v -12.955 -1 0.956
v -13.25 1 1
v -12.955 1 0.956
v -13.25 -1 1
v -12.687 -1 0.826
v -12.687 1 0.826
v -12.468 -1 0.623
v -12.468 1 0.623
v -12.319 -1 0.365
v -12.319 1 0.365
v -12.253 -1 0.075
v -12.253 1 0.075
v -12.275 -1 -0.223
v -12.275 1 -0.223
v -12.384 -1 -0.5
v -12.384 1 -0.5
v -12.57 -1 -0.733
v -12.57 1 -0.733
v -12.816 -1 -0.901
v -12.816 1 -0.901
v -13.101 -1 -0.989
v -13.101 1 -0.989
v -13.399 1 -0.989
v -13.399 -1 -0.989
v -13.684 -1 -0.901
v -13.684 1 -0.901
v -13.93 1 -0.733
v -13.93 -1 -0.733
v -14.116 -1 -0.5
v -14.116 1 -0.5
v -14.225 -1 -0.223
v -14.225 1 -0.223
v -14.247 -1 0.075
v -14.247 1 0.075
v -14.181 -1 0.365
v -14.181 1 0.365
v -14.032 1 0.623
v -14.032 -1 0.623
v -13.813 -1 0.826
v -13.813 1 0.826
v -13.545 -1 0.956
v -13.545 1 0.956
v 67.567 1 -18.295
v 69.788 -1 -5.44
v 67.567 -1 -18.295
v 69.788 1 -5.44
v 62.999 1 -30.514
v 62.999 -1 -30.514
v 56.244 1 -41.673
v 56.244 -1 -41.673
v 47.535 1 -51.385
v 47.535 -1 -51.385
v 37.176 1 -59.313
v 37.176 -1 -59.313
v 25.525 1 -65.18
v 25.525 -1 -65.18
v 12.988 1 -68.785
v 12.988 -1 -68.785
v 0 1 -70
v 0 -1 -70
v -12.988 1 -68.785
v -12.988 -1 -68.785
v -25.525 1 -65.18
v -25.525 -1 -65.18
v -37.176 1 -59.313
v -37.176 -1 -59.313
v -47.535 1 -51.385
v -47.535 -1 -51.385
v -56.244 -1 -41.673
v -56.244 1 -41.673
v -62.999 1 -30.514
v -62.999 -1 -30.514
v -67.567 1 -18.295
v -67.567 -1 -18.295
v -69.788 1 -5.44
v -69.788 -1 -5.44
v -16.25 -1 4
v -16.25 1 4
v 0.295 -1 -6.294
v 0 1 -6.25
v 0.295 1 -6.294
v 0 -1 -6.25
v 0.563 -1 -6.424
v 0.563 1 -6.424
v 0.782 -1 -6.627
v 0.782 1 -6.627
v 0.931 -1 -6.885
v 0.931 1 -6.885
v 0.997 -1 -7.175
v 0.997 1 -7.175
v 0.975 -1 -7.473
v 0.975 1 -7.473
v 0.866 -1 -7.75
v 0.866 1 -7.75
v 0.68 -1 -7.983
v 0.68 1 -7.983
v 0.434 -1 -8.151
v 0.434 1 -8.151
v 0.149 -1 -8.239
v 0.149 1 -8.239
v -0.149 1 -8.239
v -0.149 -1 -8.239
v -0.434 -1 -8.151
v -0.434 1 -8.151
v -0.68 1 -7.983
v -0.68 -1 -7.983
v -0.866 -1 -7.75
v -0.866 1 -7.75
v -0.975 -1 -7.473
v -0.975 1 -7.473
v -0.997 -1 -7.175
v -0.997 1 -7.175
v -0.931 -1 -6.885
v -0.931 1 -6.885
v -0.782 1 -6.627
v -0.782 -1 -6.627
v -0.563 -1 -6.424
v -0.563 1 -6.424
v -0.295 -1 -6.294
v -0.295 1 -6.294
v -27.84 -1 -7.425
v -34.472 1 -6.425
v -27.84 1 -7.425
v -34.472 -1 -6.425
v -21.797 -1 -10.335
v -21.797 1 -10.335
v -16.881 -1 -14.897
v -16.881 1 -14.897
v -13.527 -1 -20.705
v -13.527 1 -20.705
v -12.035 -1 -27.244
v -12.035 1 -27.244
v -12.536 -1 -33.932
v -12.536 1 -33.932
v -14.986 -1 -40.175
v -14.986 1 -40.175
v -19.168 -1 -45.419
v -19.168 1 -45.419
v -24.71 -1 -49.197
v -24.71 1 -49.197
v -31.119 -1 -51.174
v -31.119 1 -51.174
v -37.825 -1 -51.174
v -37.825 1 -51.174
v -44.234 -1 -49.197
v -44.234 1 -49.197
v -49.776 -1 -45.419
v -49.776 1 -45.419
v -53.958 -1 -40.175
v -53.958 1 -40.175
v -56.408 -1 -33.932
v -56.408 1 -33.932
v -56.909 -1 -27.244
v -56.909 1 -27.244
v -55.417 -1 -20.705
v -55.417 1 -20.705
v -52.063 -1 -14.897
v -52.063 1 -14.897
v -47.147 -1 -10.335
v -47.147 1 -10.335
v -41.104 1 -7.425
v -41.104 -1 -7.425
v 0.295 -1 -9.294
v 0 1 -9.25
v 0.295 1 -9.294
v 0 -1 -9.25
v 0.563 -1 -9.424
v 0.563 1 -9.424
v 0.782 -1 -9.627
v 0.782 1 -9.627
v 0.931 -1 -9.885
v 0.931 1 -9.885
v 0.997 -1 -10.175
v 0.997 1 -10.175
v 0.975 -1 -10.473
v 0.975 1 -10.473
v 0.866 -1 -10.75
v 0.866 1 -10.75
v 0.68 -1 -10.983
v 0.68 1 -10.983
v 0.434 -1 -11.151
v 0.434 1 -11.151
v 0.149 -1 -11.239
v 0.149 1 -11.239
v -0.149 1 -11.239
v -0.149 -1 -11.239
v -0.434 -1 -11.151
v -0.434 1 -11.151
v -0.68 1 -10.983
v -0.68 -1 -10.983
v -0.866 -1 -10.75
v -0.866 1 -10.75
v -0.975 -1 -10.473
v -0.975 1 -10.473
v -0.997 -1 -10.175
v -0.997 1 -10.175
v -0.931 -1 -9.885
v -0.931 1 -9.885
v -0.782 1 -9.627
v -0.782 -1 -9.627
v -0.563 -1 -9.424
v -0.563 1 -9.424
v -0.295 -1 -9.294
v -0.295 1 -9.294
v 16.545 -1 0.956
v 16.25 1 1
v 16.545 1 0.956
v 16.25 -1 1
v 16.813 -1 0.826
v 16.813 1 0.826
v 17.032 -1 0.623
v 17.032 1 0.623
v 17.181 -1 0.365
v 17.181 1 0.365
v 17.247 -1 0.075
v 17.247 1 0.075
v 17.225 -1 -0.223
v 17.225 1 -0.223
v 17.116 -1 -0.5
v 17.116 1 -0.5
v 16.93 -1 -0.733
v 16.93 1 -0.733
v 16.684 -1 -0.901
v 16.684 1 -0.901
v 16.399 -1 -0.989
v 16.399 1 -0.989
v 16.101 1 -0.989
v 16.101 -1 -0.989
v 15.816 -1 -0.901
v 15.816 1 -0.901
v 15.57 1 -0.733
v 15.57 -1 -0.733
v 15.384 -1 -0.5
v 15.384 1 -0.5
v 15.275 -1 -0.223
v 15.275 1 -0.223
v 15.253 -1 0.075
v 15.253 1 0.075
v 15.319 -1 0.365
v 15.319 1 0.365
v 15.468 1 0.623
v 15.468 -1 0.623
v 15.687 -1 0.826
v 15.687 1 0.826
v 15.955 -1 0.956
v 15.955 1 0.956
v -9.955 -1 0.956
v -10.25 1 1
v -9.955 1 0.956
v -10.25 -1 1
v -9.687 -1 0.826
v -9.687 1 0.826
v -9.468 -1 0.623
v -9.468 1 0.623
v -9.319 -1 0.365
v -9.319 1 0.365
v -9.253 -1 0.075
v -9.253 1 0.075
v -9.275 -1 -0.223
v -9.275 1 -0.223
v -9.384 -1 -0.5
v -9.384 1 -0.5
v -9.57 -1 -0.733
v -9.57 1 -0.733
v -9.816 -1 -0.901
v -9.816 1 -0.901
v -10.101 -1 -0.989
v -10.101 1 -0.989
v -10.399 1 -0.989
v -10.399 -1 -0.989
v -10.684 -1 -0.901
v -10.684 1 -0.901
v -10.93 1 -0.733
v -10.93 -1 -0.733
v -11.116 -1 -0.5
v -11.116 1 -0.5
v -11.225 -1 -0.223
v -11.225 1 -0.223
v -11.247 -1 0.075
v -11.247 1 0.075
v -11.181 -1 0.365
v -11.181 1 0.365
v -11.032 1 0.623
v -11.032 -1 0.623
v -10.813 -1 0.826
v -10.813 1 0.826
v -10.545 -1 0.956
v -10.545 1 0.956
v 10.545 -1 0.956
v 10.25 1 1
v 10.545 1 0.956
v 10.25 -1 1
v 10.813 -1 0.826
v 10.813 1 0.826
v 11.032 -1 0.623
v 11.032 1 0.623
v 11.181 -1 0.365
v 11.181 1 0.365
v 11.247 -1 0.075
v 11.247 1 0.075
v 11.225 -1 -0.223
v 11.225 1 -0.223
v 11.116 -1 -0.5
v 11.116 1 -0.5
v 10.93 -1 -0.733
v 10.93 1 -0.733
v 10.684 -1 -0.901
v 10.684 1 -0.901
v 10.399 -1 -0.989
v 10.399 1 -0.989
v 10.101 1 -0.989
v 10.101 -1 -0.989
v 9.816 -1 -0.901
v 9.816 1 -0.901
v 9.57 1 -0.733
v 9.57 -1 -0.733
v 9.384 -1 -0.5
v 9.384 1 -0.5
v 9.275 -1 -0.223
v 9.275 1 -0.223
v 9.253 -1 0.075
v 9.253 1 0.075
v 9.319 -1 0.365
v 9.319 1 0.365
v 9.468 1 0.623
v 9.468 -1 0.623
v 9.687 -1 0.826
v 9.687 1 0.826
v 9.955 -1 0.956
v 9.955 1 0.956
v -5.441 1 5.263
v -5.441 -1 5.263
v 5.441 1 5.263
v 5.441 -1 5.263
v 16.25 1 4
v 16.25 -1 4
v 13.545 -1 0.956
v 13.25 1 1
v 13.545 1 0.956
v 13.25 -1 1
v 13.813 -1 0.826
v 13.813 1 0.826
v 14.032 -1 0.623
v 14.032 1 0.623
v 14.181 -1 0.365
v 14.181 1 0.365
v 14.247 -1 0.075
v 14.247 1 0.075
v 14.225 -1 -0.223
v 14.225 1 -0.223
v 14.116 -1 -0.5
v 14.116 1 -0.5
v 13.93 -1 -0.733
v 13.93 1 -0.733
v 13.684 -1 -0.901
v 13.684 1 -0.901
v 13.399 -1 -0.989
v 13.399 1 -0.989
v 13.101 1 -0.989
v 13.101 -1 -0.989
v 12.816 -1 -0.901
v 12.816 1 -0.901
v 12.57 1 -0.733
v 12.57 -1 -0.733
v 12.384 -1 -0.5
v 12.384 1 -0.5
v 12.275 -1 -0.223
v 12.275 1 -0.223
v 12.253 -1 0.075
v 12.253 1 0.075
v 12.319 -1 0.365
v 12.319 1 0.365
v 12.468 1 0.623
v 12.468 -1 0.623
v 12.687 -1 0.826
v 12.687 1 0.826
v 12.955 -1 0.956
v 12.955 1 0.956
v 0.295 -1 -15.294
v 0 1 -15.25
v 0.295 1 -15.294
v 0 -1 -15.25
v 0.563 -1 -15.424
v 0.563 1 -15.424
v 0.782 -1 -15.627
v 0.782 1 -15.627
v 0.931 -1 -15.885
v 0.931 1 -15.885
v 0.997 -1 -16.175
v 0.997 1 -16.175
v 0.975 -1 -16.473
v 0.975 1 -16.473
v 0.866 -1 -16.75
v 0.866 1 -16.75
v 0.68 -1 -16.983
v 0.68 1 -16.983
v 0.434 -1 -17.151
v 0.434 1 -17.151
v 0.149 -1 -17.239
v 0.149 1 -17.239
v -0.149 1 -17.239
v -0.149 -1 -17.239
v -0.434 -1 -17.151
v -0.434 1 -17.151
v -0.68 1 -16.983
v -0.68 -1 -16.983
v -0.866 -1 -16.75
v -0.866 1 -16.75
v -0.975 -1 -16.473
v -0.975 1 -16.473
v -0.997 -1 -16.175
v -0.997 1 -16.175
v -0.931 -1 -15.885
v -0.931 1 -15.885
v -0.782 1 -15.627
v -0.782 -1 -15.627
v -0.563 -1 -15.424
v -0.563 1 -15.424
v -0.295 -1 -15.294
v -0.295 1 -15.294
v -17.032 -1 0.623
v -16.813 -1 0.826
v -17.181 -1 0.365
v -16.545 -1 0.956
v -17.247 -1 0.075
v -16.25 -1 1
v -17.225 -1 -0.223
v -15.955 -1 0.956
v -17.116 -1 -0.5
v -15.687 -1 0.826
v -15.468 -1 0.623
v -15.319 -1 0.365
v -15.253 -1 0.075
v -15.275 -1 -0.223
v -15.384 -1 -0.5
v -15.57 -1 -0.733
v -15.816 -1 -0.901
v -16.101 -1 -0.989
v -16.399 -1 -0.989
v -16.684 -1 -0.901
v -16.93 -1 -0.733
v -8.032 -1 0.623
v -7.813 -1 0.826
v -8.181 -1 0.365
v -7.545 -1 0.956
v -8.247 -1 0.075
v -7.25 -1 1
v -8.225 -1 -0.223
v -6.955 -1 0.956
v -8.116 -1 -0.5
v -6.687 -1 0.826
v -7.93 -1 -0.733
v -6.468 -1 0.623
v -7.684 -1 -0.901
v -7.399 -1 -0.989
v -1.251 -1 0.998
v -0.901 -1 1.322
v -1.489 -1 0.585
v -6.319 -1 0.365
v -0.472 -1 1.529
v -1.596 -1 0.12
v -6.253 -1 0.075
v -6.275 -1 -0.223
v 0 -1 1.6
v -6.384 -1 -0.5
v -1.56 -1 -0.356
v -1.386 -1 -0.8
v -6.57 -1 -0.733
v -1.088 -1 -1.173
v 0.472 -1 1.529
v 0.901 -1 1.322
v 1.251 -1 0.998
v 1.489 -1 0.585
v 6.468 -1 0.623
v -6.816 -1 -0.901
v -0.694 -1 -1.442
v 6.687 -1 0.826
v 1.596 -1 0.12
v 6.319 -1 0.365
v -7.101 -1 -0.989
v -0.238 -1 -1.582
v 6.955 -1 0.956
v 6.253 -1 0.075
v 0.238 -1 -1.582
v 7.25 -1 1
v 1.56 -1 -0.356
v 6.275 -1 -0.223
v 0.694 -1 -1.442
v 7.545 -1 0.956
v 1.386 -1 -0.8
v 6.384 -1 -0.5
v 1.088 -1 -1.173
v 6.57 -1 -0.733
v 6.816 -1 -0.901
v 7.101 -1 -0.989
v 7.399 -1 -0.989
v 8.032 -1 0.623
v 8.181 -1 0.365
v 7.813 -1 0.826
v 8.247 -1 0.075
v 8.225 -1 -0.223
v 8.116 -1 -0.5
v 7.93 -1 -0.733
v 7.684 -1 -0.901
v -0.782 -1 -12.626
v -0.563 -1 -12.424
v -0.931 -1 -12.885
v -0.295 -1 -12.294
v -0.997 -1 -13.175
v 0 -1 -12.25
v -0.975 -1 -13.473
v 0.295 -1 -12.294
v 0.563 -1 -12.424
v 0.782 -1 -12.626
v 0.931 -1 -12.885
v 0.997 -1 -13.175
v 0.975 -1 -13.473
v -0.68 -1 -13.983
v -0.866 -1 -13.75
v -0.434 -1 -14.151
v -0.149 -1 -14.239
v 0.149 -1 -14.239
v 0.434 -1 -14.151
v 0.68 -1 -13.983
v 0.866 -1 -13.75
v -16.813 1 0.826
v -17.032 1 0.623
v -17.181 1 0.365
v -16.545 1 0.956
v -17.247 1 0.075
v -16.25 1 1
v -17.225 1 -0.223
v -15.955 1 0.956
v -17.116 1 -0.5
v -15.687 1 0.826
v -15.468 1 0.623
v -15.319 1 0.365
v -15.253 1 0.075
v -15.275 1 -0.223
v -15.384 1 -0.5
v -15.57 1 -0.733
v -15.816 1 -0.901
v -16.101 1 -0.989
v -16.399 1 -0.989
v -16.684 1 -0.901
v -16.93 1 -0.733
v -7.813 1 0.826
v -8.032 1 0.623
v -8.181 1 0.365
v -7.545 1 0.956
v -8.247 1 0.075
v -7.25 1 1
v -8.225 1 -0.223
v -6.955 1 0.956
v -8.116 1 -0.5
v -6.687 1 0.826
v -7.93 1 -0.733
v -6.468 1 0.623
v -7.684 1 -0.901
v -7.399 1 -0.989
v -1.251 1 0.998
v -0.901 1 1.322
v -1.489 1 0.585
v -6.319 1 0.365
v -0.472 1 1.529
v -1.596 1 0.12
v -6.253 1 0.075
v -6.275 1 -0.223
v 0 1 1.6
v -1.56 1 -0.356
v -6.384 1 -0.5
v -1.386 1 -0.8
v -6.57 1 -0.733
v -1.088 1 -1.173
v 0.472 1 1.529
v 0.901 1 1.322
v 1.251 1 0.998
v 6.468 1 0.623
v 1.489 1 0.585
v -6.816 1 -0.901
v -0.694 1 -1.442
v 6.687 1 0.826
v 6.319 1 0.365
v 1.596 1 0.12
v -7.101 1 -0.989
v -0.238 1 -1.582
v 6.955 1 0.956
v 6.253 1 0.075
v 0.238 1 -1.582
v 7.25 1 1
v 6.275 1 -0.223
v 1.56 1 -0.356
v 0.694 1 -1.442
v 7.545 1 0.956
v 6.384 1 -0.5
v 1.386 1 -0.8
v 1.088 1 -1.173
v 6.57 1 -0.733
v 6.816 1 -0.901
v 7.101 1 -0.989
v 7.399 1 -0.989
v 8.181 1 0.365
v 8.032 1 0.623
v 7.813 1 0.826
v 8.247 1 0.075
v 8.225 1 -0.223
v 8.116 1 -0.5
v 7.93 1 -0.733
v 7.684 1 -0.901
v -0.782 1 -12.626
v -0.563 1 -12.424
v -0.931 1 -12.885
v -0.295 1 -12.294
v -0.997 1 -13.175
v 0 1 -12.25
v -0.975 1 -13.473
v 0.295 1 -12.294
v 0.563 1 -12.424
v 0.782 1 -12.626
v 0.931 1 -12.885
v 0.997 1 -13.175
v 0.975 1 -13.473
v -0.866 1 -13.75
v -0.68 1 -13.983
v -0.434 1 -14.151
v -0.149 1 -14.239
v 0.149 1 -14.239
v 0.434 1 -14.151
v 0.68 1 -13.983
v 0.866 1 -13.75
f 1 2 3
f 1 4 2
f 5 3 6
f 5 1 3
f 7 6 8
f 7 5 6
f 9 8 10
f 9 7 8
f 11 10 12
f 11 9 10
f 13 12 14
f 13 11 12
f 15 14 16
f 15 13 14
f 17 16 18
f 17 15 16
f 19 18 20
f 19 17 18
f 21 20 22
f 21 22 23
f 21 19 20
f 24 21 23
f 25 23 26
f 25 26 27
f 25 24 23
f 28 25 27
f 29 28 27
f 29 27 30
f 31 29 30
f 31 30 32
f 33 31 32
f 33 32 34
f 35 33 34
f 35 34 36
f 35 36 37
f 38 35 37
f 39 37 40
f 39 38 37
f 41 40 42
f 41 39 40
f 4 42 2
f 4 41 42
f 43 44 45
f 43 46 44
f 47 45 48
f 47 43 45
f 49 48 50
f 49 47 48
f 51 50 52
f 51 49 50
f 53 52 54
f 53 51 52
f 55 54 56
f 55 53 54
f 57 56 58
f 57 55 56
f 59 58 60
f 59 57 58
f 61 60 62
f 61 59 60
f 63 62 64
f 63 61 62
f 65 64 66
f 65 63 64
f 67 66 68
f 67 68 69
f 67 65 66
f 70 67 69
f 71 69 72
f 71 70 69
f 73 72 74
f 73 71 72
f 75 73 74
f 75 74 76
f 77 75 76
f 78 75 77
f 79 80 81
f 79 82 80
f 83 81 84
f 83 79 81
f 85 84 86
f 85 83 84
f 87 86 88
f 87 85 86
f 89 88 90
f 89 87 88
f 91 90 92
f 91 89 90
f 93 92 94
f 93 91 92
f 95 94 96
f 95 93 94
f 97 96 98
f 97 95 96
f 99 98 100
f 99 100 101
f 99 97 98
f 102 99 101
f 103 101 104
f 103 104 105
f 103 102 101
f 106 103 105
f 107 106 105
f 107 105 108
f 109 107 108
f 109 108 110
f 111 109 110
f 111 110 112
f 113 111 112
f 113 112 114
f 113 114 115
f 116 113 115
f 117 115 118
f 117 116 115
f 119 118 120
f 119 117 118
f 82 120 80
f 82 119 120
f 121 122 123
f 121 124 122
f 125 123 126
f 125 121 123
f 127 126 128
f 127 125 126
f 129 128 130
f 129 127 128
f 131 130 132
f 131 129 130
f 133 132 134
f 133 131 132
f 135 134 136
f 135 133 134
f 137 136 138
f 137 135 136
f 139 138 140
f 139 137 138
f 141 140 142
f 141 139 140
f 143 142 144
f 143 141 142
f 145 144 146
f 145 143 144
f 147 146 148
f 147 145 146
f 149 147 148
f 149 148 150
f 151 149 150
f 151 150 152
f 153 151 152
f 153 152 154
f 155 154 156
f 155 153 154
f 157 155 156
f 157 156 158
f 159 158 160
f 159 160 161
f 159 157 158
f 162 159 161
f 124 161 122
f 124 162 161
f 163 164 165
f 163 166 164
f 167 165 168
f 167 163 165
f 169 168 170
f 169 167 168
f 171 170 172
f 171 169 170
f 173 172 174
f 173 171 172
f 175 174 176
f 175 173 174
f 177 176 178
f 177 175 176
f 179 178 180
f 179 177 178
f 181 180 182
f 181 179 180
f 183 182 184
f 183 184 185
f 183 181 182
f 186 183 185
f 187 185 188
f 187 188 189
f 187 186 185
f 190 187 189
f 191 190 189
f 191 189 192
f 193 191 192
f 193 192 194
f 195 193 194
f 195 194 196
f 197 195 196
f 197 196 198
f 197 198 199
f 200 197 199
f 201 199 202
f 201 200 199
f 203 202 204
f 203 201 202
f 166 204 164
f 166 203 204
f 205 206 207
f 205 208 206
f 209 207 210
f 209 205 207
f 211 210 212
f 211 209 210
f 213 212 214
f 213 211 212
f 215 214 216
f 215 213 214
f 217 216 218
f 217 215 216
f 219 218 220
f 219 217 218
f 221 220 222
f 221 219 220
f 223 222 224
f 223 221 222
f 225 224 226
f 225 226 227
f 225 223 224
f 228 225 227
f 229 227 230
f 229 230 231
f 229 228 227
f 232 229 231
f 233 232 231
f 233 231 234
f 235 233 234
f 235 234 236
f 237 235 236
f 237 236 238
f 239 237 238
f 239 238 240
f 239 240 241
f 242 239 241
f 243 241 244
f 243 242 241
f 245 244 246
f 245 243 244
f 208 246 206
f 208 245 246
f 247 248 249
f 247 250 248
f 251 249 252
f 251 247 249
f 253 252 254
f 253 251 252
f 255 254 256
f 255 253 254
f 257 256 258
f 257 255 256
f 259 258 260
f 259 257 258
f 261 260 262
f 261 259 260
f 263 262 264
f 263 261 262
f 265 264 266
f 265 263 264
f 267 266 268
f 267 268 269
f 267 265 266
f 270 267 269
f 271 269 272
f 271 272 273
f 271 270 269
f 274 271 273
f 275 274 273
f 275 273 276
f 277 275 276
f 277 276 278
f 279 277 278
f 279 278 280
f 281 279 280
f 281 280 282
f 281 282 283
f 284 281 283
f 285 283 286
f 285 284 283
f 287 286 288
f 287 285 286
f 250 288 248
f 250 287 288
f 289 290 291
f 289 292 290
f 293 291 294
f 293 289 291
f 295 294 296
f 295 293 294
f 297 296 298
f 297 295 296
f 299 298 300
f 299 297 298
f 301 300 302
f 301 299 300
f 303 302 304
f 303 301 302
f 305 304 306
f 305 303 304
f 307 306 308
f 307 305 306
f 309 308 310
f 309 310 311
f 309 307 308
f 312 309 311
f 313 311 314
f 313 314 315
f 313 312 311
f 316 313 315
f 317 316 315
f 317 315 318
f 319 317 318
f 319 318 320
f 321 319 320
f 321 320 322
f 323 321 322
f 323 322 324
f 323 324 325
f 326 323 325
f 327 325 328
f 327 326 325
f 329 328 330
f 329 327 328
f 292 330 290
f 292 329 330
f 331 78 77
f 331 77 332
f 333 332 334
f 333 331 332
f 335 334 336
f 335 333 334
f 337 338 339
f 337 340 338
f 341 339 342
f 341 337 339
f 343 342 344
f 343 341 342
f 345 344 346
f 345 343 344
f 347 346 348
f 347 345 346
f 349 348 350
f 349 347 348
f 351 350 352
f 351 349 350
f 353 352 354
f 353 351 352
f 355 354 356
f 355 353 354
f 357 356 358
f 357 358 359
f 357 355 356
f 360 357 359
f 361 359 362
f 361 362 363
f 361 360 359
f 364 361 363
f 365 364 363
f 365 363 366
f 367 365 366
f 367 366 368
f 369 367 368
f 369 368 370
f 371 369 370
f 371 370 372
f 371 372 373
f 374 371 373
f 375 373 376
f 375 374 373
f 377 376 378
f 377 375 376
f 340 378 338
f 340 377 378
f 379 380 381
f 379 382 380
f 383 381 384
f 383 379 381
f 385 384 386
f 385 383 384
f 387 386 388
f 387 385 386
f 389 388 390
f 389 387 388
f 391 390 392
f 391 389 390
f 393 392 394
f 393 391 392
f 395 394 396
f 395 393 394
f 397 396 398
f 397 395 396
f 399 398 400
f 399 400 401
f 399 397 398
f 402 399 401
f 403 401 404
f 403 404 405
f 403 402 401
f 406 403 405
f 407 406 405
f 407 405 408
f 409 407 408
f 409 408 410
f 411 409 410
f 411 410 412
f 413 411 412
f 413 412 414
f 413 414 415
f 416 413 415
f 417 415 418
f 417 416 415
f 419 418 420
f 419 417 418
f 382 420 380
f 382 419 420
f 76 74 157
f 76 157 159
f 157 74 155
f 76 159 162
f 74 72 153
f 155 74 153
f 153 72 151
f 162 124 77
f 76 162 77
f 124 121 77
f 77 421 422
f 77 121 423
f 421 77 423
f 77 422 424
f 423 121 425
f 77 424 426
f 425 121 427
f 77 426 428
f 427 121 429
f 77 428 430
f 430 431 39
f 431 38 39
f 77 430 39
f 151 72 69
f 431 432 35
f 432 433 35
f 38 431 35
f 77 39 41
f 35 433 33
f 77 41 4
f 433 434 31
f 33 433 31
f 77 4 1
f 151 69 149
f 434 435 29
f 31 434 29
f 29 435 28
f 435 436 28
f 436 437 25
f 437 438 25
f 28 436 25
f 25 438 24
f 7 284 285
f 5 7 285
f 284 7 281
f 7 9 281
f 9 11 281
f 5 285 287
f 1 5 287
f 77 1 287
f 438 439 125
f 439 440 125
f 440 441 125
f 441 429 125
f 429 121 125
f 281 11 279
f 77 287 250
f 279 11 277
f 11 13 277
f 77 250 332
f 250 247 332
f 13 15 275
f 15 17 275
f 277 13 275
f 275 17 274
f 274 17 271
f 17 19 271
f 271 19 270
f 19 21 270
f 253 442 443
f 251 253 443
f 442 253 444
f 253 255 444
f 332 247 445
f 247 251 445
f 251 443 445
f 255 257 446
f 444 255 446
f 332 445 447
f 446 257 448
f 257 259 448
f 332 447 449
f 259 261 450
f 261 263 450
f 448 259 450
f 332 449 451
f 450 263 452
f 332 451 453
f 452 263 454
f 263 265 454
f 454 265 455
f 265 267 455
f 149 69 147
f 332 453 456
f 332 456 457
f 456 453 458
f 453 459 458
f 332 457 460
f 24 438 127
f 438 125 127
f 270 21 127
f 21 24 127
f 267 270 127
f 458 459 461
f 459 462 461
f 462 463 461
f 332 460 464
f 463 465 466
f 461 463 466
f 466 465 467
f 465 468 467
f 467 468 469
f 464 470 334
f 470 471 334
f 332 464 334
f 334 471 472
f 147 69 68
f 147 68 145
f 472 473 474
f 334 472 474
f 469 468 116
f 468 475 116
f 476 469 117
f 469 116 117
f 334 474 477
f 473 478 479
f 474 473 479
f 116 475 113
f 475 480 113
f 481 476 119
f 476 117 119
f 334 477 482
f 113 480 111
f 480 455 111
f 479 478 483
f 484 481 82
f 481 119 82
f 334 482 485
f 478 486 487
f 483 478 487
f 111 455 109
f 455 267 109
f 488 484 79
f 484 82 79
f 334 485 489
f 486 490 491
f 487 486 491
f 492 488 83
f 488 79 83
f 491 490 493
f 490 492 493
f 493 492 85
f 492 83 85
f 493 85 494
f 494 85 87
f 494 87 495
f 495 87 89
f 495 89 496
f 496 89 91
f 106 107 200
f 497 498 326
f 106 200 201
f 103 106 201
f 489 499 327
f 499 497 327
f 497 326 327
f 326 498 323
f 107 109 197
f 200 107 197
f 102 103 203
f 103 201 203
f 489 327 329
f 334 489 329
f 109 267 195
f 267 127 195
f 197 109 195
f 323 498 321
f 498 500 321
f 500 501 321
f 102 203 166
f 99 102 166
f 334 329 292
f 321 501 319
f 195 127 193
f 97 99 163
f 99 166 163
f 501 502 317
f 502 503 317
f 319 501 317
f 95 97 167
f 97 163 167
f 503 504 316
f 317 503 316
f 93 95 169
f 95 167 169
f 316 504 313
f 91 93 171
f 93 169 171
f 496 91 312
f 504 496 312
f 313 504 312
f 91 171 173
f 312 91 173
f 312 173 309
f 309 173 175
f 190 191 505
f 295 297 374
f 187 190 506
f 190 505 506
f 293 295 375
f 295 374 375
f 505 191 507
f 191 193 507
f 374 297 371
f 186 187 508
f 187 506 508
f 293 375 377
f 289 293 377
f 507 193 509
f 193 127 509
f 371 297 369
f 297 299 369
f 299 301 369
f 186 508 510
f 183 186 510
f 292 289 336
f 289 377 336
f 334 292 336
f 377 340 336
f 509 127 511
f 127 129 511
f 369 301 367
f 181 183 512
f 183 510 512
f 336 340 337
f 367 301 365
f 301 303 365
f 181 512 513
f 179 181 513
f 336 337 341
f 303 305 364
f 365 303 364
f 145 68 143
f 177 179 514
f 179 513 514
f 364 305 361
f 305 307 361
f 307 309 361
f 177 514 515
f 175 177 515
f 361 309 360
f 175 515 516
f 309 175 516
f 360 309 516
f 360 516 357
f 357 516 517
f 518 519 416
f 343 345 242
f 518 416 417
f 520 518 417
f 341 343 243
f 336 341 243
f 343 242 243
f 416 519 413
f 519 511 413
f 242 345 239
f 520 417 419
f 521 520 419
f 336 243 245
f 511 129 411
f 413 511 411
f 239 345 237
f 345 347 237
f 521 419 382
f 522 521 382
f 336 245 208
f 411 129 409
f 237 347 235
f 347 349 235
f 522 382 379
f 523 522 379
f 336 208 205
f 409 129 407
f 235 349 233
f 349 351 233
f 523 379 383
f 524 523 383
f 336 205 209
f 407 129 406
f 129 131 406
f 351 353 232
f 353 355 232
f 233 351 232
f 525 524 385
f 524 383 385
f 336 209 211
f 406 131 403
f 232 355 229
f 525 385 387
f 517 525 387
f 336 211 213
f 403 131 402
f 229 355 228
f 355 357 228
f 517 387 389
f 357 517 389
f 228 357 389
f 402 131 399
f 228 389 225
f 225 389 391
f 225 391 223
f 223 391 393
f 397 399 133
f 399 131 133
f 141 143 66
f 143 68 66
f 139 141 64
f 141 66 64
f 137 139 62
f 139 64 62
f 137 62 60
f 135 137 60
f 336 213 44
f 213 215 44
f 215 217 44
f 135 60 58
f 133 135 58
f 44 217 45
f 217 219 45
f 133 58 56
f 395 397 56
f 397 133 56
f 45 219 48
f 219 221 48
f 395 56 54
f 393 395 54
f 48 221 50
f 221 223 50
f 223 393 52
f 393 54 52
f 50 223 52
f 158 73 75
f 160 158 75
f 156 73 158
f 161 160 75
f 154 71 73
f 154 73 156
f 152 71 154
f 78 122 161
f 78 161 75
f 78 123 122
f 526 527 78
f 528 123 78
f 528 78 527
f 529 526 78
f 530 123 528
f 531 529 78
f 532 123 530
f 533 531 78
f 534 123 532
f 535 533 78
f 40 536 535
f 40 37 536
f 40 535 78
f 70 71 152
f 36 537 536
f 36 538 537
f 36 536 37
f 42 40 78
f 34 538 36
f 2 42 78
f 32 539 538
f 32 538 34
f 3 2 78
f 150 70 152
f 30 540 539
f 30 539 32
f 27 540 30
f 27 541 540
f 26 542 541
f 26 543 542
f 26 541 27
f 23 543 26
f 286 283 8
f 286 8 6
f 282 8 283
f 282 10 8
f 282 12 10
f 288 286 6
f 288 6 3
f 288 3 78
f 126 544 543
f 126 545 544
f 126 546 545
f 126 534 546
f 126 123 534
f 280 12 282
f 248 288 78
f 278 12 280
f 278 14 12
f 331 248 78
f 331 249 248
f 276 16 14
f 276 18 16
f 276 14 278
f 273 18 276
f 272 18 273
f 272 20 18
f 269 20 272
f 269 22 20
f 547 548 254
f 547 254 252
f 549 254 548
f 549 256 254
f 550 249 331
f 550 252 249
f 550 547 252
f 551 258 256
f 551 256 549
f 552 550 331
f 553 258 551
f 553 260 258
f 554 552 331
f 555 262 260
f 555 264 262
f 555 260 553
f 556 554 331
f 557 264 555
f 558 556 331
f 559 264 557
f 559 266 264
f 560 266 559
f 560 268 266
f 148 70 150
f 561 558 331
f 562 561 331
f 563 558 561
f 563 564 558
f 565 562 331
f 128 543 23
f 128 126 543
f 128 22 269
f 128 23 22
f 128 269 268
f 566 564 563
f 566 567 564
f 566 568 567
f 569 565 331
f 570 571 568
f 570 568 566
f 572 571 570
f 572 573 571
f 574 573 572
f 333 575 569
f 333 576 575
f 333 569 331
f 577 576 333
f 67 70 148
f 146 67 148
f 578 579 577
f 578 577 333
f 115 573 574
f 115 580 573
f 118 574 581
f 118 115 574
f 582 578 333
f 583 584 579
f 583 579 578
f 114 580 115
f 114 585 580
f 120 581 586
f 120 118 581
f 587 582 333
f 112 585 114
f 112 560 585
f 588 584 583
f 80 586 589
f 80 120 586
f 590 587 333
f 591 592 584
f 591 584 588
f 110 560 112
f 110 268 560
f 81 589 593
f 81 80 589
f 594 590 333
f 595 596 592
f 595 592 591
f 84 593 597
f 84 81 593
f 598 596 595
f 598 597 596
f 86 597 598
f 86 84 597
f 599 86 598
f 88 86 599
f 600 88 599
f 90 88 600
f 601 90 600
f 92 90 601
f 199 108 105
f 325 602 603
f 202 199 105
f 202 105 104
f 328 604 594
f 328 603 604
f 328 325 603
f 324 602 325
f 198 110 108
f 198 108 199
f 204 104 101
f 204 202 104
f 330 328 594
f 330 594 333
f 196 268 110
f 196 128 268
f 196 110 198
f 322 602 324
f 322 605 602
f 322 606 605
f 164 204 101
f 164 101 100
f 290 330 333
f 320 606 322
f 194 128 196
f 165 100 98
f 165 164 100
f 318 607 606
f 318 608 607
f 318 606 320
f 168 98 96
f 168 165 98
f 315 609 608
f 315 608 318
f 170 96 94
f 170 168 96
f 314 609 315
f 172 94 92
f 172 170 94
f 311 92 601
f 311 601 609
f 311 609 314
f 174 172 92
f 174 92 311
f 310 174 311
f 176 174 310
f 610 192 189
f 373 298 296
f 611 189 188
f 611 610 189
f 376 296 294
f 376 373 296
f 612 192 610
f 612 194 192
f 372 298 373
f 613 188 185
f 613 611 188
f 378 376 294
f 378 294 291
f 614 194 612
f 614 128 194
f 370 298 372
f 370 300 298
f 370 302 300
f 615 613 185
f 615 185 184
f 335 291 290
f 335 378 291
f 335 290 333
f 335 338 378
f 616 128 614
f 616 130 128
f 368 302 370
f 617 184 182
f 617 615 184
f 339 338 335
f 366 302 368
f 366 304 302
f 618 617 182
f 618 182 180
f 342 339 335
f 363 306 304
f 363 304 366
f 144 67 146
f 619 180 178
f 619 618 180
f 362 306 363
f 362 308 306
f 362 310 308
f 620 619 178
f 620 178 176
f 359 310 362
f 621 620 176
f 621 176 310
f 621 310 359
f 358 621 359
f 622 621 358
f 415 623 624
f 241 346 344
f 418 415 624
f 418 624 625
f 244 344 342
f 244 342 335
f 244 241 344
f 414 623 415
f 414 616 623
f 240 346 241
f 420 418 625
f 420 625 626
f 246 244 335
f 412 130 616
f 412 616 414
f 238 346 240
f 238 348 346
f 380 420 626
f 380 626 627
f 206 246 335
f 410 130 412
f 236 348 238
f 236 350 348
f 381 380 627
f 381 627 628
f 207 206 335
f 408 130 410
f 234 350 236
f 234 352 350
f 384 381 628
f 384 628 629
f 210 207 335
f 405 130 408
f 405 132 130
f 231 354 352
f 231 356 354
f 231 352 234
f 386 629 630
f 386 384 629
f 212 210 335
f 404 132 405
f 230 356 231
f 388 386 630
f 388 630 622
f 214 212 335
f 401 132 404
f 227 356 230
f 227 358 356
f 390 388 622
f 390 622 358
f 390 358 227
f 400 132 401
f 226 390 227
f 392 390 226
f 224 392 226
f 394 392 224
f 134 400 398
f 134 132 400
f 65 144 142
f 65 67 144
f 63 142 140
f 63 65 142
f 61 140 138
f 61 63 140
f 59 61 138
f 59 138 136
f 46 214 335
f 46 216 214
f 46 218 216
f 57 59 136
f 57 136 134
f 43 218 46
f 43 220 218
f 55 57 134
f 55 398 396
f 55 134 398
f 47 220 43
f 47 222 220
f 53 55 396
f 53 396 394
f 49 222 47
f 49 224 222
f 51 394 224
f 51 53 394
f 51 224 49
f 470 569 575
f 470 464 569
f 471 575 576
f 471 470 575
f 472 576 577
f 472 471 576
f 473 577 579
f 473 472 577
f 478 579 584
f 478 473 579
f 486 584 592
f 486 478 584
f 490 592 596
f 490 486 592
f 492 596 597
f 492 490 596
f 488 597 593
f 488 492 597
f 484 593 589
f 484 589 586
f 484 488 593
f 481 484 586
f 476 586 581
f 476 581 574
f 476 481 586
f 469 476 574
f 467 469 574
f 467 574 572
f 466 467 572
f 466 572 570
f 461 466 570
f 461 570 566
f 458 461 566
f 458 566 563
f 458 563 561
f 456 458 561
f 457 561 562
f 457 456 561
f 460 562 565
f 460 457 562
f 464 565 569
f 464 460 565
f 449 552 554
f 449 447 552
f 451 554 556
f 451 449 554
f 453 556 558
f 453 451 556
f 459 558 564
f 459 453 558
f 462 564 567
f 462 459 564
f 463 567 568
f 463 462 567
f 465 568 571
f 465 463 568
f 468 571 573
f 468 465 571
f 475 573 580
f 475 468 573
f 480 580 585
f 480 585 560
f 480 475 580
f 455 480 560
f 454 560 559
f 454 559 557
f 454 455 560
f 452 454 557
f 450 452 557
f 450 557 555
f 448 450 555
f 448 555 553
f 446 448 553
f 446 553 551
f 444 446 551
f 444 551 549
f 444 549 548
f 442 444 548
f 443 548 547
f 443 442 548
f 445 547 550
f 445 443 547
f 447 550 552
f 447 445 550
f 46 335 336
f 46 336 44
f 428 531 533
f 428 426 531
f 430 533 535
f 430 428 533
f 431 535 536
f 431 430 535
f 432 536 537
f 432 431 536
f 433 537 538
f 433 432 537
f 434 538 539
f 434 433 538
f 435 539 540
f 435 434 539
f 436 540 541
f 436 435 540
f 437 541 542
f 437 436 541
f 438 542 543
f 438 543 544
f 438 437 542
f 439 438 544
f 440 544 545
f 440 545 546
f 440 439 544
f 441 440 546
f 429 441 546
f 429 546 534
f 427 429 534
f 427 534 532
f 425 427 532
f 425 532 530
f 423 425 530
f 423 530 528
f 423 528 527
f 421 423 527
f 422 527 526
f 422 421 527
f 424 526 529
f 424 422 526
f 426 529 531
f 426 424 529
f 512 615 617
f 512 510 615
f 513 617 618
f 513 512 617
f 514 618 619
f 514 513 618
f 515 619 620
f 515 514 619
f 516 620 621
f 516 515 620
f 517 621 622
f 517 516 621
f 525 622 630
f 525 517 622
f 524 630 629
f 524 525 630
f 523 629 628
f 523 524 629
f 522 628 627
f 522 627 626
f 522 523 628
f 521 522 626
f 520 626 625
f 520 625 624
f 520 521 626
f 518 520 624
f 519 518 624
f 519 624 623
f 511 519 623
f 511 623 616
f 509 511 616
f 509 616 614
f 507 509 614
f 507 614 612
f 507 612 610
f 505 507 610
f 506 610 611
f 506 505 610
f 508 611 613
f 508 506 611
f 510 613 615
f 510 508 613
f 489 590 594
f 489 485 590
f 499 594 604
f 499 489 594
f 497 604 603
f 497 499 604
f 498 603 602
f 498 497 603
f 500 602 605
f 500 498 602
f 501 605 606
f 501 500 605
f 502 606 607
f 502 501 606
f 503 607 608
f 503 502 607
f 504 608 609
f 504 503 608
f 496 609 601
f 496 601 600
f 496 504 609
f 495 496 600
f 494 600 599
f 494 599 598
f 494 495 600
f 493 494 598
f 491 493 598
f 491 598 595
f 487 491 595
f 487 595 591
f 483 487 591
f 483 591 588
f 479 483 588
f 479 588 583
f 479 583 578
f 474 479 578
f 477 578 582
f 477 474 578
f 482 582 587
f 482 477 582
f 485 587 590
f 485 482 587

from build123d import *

# Parameters (mm, degrees)
SKETCH_1_R      = 1
SKETCH_1_R_2    = 1.6
SKETCH_1_R_3    = 22.5
EXTRUDE_1_DEPTH = 1


with BuildPart() as part:
    # 草圖1 → 填料-伸長1 (new, symmetric)
    with BuildSketch(Plane(origin=(0, 0, 0), x_dir=(1, 0, 0), z_dir=(0, 1, 0))):
        with BuildLine():
            Line((-69.788277988, 5.440244057), (-16.249993495, -4))
            ThreePointArc((-16.249993495, -4), (0, -5.421690213), (16.249993495, -4))
            Line((16.249993495, -4), (69.788277988, 5.440244057))
            ThreePointArc((69.788277988, 5.440244057), (0, 70), (-69.788277988, 5.440244057))
        make_face()
        with Locations(Location((16.249993495, 0, 0), (0, 0, 270))):
            Circle(SKETCH_1_R, mode=Mode.SUBTRACT)
        with Locations(Location((13.249989391, 0, 0), (0, 0, 270))):
            Circle(SKETCH_1_R, mode=Mode.SUBTRACT)
        with Locations(Location((10.249991793, 0, 0), (0, 0, 270))):
            Circle(SKETCH_1_R, mode=Mode.SUBTRACT)
        with Locations(Location((7.249994195, 0, 0), (0, 0, 270))):
            Circle(SKETCH_1_R, mode=Mode.SUBTRACT)
        with Locations(Location((-16.249993495, 0, 0), (0, 0, 270))):
            Circle(SKETCH_1_R, mode=Mode.SUBTRACT)
        with Locations(Location((-13.249989391, 0, 0), (0, 0, 270))):
            Circle(SKETCH_1_R, mode=Mode.SUBTRACT)
        with Locations(Location((-10.249991793, 0, 0), (0, 0, 270))):
            Circle(SKETCH_1_R, mode=Mode.SUBTRACT)
        with Locations(Location((-7.249994195, 0, 0), (0, 0, 270))):
            Circle(SKETCH_1_R, mode=Mode.SUBTRACT)
        with Locations(Location((0, 16.249993495, 0), (0, 0, 270))):
            Circle(SKETCH_1_R, mode=Mode.SUBTRACT)
        with Locations(Location((0, 13.249989391, 0), (0, 0, 270))):
            Circle(SKETCH_1_R, mode=Mode.SUBTRACT)
        with Locations(Location((0, 10.249991793, 0), (0, 0, 270))):
            Circle(SKETCH_1_R, mode=Mode.SUBTRACT)
        with Locations(Location((0, 7.249994195, 0), (0, 0, 270))):
            Circle(SKETCH_1_R, mode=Mode.SUBTRACT)
        with Locations(Location((0, 0, 0), (0, 0, 270))):
            Circle(SKETCH_1_R_2, mode=Mode.SUBTRACT)
        with Locations(Location((-34.47199994, 28.925442436, 0), (0, 0, 270))):
            Circle(SKETCH_1_R_3, mode=Mode.SUBTRACT)
    extrude(amount=EXTRUDE_1_DEPTH, both=True)


solid = part.part
